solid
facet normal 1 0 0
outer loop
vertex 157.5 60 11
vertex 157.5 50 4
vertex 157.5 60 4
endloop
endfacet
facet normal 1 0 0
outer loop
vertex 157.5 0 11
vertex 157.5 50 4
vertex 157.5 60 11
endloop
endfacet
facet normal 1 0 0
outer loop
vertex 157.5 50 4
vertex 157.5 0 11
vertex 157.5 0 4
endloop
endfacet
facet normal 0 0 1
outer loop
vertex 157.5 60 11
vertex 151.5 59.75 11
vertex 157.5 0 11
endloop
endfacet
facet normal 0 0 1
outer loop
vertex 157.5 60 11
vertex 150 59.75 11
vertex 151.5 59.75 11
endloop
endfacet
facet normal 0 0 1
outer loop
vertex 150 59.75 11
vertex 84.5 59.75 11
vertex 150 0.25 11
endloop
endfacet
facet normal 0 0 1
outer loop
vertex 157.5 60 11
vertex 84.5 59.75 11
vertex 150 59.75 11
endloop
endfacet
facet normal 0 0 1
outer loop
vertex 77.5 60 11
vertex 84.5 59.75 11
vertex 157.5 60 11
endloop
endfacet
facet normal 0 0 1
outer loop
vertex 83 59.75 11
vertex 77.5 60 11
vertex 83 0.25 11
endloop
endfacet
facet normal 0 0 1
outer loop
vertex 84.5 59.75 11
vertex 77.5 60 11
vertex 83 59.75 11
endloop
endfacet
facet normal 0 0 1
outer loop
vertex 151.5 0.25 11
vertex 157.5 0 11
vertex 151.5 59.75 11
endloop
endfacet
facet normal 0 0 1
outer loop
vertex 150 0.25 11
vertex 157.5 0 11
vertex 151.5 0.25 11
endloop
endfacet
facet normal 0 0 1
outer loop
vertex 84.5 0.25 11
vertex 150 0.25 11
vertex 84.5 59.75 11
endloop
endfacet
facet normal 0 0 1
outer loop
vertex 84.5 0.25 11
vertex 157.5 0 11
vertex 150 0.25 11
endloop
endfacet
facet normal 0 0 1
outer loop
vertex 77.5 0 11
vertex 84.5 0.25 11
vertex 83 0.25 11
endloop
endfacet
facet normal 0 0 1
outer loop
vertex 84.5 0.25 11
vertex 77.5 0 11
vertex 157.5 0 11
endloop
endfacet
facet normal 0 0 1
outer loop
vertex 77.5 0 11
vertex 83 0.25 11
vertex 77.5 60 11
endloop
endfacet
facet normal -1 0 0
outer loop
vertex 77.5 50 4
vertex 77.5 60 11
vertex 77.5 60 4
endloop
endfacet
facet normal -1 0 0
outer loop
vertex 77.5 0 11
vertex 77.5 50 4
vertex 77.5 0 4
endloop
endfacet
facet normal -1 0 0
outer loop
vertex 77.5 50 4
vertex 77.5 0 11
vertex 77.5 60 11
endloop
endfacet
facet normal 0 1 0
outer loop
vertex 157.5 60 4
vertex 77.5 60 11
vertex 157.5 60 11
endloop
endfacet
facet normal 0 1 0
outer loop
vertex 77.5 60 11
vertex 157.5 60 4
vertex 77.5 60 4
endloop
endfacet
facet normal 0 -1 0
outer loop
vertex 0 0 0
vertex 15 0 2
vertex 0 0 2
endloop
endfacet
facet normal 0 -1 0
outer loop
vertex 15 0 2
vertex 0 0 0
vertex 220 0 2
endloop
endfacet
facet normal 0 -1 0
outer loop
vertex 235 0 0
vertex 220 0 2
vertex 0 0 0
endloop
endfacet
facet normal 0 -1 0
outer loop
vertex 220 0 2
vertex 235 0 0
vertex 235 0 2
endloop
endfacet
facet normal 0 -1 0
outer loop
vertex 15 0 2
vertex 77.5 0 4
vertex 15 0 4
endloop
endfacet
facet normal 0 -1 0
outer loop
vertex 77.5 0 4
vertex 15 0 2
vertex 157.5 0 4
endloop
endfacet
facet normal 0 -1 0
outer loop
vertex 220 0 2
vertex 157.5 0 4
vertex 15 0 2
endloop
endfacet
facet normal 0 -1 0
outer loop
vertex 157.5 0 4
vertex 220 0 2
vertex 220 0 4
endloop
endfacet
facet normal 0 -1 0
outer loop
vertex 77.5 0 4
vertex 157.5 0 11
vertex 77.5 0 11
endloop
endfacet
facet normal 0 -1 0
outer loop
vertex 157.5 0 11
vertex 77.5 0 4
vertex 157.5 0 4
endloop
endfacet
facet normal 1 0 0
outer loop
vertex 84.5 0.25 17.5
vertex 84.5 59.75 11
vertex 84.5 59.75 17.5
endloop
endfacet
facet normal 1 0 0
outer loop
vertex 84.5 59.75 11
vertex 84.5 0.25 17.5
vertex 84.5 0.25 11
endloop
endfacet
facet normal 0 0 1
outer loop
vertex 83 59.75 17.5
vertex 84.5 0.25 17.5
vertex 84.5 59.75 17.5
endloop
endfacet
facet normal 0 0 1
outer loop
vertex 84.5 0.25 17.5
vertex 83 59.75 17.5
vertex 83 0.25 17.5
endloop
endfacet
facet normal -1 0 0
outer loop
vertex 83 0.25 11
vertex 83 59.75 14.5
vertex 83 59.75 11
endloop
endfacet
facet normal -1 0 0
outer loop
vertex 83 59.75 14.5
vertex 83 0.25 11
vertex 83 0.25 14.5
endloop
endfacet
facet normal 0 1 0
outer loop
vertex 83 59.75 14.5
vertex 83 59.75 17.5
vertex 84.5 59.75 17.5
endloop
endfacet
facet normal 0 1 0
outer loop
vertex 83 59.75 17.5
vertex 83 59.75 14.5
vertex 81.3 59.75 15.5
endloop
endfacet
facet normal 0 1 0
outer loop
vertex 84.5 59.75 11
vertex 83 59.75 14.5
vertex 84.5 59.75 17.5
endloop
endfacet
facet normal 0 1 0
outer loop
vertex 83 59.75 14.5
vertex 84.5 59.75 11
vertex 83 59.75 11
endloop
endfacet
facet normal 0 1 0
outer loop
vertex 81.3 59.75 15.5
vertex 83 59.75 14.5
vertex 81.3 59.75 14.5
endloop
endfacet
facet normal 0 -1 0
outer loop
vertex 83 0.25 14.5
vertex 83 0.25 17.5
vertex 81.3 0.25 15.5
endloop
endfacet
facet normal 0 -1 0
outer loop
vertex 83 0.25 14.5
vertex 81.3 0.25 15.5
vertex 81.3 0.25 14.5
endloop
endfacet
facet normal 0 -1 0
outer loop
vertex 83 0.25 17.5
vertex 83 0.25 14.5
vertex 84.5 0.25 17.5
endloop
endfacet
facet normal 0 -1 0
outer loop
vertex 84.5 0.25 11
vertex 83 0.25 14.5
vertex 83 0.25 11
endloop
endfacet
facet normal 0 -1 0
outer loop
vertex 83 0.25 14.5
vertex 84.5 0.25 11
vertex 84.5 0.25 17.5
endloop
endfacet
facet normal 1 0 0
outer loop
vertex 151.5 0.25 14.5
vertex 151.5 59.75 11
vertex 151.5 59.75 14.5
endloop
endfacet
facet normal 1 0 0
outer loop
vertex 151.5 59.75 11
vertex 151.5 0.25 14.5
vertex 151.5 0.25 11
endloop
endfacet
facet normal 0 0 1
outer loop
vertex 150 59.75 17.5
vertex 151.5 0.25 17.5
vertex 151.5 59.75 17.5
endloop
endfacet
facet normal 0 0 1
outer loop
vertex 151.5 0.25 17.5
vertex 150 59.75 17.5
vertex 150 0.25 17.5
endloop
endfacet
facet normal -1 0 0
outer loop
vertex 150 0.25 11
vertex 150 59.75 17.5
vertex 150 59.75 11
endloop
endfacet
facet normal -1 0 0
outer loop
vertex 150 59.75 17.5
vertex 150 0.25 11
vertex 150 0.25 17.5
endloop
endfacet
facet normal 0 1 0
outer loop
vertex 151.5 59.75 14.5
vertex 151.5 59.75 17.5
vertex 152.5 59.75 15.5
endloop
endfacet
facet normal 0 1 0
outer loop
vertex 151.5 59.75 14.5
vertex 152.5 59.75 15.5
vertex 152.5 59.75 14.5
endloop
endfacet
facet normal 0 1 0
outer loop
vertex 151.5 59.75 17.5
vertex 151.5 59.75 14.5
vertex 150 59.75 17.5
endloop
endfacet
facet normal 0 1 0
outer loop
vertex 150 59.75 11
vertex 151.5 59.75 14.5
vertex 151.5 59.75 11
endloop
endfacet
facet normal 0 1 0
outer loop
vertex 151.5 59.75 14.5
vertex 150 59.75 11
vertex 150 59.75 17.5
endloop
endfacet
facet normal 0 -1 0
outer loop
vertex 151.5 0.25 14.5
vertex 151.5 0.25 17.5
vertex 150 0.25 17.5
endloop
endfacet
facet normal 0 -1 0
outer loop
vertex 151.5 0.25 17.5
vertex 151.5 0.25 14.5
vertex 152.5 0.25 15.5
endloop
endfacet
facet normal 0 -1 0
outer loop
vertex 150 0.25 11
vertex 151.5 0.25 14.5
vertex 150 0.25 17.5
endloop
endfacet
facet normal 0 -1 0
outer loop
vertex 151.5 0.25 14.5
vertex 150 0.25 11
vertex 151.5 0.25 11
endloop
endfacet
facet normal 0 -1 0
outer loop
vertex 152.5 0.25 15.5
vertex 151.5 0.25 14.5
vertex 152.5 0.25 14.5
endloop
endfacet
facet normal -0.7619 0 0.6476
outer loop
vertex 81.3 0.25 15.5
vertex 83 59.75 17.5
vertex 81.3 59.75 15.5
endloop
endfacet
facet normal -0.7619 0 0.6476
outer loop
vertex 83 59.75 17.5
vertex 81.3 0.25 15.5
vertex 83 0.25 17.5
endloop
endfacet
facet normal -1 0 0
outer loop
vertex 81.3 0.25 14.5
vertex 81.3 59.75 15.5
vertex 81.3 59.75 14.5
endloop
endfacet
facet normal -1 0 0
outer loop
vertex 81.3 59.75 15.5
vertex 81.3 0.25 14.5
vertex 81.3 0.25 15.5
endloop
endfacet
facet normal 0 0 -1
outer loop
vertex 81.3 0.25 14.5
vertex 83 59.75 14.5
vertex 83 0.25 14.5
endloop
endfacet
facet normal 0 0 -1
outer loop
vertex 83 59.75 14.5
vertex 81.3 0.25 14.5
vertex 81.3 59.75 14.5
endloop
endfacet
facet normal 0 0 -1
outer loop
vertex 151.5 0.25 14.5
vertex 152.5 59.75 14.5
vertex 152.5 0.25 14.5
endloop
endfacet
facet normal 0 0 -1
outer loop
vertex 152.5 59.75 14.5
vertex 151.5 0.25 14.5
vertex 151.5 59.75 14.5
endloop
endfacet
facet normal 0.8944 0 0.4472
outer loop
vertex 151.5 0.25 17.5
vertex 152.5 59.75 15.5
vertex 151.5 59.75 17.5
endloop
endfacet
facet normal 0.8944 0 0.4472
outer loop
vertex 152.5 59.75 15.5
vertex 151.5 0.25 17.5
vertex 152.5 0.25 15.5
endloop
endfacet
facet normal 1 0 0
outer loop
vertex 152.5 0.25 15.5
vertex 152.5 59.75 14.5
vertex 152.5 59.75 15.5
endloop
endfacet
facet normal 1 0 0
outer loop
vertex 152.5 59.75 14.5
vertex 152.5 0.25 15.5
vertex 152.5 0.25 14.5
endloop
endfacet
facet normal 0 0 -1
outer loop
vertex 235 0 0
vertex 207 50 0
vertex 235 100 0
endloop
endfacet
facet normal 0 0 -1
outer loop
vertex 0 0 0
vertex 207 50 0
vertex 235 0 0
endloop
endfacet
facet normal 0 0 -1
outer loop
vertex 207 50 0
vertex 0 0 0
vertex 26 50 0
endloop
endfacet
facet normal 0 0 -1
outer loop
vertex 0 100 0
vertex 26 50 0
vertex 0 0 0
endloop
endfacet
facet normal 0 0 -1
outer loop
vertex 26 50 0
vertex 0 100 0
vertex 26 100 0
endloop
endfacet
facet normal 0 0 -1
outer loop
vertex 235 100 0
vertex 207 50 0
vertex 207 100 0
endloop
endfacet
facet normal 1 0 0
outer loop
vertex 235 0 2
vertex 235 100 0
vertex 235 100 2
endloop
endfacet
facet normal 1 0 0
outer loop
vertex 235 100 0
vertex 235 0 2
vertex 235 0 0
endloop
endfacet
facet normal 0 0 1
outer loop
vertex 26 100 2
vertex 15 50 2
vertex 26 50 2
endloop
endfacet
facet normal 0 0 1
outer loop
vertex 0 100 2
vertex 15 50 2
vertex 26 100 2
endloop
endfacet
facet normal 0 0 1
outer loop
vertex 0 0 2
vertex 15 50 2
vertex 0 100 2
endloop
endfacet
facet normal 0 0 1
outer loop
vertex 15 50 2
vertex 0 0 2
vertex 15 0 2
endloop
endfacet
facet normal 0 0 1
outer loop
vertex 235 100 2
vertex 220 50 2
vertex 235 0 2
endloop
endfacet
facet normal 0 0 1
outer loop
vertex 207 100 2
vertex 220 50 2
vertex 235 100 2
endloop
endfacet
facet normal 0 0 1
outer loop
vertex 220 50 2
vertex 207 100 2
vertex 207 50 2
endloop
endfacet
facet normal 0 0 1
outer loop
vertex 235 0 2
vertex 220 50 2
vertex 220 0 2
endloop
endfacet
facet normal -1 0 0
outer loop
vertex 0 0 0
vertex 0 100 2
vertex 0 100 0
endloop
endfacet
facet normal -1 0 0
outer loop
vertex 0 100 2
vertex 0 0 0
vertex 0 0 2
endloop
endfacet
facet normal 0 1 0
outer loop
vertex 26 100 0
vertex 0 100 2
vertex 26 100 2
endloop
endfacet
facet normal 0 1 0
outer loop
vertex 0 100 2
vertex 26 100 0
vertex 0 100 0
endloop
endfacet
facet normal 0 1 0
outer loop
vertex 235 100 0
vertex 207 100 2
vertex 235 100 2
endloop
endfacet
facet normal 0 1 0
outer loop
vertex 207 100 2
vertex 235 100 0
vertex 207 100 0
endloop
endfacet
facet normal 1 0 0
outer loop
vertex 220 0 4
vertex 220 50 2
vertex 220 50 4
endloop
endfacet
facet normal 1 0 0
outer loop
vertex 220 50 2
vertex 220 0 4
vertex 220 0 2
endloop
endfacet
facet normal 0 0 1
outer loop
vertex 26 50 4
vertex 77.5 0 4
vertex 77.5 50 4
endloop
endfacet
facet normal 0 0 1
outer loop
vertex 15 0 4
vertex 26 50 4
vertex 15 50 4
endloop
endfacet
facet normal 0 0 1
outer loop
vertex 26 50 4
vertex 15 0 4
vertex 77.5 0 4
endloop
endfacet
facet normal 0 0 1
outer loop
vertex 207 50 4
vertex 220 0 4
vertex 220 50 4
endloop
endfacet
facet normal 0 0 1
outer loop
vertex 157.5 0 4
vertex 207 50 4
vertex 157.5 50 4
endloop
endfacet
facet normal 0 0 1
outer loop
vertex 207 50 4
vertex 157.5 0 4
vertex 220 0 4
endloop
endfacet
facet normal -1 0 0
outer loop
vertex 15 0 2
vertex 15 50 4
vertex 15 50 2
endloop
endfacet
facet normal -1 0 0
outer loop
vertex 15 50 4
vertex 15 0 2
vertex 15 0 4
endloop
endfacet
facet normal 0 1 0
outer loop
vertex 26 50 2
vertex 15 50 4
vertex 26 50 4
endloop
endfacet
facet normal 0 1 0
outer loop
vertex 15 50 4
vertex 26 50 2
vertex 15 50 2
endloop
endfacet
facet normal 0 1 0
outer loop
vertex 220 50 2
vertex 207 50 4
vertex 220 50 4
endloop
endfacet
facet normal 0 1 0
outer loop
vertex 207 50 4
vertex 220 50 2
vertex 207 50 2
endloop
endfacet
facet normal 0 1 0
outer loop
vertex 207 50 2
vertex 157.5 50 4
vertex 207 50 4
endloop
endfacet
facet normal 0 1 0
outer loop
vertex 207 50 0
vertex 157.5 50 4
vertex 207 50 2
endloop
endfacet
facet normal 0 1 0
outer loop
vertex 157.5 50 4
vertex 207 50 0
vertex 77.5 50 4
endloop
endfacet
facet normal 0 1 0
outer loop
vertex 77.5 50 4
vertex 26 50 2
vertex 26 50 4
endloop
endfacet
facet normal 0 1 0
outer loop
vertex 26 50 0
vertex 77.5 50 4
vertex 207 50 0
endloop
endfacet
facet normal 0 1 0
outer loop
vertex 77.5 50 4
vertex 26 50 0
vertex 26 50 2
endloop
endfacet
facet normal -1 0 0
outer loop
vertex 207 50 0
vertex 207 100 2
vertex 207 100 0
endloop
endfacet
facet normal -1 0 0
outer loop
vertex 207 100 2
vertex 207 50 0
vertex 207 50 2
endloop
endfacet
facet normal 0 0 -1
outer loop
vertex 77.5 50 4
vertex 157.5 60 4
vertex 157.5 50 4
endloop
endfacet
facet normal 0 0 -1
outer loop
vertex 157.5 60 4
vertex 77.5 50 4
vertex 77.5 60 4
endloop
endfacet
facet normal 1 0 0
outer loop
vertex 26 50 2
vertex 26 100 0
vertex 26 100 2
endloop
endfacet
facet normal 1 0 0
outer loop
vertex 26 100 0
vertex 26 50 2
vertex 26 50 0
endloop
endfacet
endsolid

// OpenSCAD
// file: ../clip.scad
use <./utils.scad>

tollerance = 0.5;

module femaleClip(holeWidth, holeHeight, thickness) {
    difference() {
    translate([0,0,thickness]) cube([width, height, thickness]);
    translate([CENTER(width, holeWidth), CENTER(height, holeHeight), thickness]) cube([holeWidth, holeHeight, thickness]);
    }
}

module maleClip(width, height, holeHeight, thickness, edgeWidth) {
    cube([width, height, thickness]);
    clipHeight = holeHeight - tollerance;
    clipWidth = thickness*.5;
    clipDepth = thickness *2 + tollerance;

    translate([edgeWidth/2+tollerance, CENTER(height, clipHeight),thickness]) cube([clipWidth, clipHeight, clipDepth]);
    translate([width-edgeWidth/2-1-clipWidth, CENTER(height, clipHeight),thickness]) cube([clipWidth, clipHeight, clipDepth]);
    translate([edgeWidth/2+tollerance, CENTER(height, clipHeight)+clipHeight, clipDepth]) rotate(180) {
        clipExtension(clipHeight, thickness, 1.7, 1);
    }

    translate([width-edgeWidth/2-1, CENTER(height, clipHeight),clipDepth]) 
    clipExtension(clipHeight, thickness, 1., 1);
}

module clipExtension(width, height, depth, edge) {
    rotate([90,0,0]) {
        translate([0,0,-width]) linear_extrude(height=width) polygon([
            [0, 0],
            [0, height],
            [depth, edge],
            [depth, 0],
            [0, 0],
        ]);
    }
}
// file: ../utils.scad
function CENTER(parentCoordinate, childCoordinate) = 
    parentCoordinate / 2 - childCoordinate / 2;
// main file
use <./../utils.scad>;
use <./../clip.scad>;

screenStandWidth = 81;
screenStandHeight = 50;

interfaceHeight = 100;
interfaceThickness = 2;
thickness = 4;

width = 235;
height = 50;
backplateWidth = width-30;

clipHoleWidth=70;
clipHoleHeight=50;

difference() {
    union() {
        screenInterface(width, interfaceHeight, interfaceThickness);
        translate([CENTER(width, backplateWidth),0,0]) backplate(backplateWidth, height, thickness);
        translate([CENTER(width, clipHoleWidth+10),0,0]) screenStand(clipHoleWidth+10, clipHoleHeight+10, thickness*2);
    }

    gapWidth = 50;

    translate([width/2-screenStandWidth/2-gapWidth-1, height, 0]) gap(gapWidth*2+screenStandWidth, gapWidth, thickness);
}

module gap(width, height, thickness) {
        #cube([width, height, thickness]);
}

module screenInterface(width, height, depth) {
        cube([width, height, depth]);
}

module backplate(width, height, thickness) {
    cube([width, height, thickness]);
}

module screenStand (width, height, thickness) {
    union() {
        cube([width, height, thickness]);
        translate([0,0, thickness]) maleClip(width, height, height, 3, 10);
    }
}
